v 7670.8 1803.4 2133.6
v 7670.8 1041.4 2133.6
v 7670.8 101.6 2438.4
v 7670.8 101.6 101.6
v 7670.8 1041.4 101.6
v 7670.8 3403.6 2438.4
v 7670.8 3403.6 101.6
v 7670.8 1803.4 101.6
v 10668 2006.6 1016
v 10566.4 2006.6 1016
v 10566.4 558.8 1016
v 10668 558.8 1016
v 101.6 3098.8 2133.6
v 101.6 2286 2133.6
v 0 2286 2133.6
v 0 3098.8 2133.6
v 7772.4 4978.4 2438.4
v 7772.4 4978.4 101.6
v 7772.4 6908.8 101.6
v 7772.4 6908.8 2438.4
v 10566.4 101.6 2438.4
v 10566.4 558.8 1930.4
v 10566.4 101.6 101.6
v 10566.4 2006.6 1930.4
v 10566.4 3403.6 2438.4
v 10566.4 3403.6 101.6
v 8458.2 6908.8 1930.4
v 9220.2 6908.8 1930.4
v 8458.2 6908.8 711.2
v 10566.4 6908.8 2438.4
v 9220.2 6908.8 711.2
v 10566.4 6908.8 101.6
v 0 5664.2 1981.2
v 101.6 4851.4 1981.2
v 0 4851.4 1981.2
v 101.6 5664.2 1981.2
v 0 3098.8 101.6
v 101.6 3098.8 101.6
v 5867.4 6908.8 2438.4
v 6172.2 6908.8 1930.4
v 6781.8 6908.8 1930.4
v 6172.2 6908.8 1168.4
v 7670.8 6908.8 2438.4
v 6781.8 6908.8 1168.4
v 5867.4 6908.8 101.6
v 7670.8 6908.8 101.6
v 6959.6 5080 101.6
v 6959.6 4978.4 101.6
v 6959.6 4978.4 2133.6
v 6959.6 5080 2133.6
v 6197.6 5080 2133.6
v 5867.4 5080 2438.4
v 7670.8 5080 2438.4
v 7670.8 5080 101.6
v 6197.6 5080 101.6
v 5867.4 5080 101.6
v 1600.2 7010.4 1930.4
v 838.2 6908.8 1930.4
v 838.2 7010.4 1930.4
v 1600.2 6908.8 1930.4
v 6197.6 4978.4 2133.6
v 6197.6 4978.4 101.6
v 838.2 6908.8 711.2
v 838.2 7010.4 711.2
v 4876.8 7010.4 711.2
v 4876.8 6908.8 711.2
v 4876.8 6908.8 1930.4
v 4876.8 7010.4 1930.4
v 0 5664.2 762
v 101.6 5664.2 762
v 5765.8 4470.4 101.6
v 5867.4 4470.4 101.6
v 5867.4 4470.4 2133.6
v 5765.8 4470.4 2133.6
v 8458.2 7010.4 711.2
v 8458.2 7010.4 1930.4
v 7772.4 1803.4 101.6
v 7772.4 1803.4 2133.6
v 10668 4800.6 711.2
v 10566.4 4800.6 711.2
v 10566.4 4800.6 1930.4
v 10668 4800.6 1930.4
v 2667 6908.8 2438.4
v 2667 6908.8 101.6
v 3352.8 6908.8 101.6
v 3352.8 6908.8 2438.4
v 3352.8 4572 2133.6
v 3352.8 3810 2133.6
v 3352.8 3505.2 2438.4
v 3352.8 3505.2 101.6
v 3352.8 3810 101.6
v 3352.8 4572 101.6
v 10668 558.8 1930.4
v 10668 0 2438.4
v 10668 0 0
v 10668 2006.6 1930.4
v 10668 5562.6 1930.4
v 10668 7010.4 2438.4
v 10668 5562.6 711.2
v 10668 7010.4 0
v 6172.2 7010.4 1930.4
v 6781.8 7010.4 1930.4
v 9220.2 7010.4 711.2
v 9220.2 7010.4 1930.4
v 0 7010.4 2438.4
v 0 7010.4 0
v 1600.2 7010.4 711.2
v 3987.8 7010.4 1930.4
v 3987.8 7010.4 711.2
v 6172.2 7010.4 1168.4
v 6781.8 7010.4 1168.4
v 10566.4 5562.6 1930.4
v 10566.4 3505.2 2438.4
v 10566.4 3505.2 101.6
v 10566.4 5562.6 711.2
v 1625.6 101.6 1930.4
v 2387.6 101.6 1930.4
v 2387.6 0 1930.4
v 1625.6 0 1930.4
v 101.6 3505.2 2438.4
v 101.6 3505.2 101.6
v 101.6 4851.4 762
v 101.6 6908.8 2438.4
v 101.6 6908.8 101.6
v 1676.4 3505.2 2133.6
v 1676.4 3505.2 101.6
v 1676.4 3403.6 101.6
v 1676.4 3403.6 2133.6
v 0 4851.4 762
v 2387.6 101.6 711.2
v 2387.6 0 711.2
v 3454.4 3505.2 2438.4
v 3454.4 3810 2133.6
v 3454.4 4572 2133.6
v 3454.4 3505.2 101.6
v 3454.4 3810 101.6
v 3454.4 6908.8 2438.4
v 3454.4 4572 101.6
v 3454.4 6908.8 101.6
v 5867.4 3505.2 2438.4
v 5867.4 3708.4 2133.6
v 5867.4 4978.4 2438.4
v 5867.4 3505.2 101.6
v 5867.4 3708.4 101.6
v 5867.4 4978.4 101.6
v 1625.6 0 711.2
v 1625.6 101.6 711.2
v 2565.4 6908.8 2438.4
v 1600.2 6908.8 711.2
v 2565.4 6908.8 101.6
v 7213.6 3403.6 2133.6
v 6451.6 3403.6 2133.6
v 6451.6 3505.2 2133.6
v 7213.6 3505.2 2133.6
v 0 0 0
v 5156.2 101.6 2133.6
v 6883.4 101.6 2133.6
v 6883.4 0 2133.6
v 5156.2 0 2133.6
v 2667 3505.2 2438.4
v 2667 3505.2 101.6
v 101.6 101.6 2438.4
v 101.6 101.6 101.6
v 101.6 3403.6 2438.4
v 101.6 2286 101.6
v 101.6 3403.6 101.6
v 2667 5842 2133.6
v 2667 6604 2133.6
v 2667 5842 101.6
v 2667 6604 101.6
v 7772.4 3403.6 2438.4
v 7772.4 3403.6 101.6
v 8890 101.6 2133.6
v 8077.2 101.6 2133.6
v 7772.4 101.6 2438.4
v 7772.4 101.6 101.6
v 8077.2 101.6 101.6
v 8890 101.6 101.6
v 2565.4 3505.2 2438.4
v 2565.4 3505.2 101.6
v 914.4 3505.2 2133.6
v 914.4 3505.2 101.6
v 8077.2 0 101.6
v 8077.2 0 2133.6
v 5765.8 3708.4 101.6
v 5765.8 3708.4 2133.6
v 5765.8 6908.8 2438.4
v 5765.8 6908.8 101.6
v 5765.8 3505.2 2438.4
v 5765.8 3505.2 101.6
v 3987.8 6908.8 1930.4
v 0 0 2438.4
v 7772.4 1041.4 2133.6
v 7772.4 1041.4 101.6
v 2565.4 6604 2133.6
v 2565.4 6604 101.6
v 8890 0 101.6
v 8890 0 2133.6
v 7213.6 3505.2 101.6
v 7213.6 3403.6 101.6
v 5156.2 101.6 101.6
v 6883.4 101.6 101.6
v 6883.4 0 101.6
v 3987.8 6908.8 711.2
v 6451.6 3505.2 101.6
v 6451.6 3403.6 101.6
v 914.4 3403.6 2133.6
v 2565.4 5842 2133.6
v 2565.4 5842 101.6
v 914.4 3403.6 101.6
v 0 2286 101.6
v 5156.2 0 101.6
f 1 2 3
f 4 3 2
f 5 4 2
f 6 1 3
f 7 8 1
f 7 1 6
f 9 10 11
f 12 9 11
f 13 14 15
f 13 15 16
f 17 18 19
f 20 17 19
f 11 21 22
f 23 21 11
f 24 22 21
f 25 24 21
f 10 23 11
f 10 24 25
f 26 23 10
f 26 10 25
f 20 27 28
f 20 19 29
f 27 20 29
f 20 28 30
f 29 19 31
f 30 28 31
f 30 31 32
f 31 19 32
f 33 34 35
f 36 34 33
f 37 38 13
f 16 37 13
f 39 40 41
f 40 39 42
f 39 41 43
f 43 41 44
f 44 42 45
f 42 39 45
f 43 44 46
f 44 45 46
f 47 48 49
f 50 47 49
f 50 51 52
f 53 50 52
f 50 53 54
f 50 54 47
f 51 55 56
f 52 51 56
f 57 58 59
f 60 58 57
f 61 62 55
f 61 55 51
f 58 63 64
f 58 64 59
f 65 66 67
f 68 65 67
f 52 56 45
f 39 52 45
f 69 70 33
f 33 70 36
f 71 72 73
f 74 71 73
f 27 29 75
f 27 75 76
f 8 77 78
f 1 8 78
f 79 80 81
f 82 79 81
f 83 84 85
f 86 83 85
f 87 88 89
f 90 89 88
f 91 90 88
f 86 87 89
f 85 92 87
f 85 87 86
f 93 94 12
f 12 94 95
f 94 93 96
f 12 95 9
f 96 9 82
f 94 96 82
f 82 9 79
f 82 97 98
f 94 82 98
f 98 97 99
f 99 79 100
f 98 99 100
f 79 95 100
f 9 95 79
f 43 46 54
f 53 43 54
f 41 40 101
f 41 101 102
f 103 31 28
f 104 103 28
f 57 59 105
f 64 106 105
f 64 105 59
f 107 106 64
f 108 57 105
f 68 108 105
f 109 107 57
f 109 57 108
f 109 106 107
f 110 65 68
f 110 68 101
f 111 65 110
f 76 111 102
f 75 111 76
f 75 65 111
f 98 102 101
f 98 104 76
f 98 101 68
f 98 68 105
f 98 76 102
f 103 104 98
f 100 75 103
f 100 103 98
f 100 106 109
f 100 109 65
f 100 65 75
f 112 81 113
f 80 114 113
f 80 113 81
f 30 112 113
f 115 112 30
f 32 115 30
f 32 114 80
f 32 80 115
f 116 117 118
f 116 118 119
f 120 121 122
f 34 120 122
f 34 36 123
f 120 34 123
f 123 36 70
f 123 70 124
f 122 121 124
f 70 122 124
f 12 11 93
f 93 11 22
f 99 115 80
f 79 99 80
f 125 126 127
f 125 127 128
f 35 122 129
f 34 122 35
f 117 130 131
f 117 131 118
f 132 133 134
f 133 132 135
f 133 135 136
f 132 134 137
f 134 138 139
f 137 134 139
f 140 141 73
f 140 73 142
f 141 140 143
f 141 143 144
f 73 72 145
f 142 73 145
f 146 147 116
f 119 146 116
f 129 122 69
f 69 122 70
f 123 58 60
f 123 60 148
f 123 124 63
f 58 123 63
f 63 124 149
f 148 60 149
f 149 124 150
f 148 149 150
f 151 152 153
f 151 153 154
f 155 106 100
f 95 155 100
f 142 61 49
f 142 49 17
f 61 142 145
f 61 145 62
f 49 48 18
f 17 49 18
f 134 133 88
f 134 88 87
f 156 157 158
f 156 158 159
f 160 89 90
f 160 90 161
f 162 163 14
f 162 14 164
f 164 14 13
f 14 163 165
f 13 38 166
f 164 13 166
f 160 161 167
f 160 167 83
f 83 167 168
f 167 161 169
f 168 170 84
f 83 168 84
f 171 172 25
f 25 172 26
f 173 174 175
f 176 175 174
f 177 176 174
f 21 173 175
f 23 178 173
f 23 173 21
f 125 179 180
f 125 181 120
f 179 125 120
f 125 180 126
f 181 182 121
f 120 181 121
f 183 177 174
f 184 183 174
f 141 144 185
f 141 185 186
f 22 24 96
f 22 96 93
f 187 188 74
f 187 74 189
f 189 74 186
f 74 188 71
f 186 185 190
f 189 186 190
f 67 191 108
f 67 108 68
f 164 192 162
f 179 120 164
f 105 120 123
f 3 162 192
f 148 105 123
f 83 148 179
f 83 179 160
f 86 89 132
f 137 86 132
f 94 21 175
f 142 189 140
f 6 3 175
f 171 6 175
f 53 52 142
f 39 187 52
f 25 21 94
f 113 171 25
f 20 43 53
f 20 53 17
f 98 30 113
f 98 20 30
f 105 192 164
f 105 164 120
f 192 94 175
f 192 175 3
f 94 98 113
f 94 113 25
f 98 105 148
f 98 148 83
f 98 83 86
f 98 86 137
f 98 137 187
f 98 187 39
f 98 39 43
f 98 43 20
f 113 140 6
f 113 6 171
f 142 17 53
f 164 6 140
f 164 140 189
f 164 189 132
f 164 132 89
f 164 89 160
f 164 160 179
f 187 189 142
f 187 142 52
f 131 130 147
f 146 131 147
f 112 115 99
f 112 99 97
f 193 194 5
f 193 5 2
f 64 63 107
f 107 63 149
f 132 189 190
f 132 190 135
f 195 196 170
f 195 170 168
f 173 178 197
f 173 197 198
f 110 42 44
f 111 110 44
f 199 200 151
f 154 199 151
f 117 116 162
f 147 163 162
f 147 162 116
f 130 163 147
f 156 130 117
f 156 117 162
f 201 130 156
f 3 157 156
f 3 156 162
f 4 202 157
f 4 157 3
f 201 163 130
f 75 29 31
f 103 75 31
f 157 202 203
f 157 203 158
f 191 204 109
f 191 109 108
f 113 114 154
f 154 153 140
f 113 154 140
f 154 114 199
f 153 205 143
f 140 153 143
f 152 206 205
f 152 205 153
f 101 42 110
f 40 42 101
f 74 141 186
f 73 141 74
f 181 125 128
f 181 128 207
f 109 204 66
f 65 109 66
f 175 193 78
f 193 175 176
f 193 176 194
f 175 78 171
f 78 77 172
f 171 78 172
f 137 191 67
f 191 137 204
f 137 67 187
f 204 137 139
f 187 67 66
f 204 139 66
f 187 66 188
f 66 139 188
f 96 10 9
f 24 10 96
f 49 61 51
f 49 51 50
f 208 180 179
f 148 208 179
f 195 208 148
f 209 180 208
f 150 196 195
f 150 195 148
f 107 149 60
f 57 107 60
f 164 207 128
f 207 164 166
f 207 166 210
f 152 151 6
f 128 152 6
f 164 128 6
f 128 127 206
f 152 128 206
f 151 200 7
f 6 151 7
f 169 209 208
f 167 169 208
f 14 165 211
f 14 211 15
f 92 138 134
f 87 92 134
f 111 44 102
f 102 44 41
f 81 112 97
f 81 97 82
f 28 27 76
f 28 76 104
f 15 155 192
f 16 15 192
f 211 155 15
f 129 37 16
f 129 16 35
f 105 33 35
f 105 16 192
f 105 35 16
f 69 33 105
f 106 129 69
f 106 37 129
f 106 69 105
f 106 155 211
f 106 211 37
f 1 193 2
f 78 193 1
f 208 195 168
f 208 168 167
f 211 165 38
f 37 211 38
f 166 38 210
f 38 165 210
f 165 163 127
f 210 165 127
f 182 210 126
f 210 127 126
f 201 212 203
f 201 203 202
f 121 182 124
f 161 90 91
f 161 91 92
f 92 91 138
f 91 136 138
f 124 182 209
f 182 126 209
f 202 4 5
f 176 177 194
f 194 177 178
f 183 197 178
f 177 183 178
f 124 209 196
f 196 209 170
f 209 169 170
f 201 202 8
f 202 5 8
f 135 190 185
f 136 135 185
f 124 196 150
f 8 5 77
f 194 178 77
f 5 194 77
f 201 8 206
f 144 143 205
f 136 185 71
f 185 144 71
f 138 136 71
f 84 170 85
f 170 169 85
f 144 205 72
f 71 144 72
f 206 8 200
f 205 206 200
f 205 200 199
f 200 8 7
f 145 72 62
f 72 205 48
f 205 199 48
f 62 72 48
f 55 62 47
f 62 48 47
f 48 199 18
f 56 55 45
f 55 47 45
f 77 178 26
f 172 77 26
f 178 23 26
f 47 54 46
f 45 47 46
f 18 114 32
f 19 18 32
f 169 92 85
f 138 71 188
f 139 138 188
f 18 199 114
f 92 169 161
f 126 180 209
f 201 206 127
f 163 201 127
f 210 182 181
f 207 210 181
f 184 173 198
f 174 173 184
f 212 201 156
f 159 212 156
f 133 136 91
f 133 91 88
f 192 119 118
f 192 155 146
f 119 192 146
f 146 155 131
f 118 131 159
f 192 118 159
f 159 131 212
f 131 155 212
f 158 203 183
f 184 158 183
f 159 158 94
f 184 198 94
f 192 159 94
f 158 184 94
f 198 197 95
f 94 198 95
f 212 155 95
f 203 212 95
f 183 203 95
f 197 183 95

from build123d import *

# Parameters (mm, degrees)
F34_W     = 10668
F34_H     = 7010.4
F0_DEPTH  = 2438.4
F35_T     = -101.6
F1_W      = 101.6
F1_H      = 3403.6
F1_H_2    = 3302
F2_DEPTH  = 2336.8
F36_W     = 762
F36_H     = 2032
F3_DEPTH  = 101.6
F37_W     = 812.8
F37_H     = 2032
F38_DEPTH = 101.6
F39_W     = 812.8
F39_H     = 2032
F4_DEPTH  = 101.6
F5_W      = 812.8
F5_H      = 1219.2
F6_DEPTH  = 101.6
F7_W      = 762
F7_H      = 1219.2
F40_DEPTH = 101.6
F8_W      = 762
F8_H      = 2032
F9_DEPTH  = 101.6
F10_W     = 762
F10_H     = 2032
F11_DEPTH = 101.6
F12_W     = 762
F12_H     = 2032
F13_DEPTH = 101.6
F14_W     = 762
F14_H     = 2032
F15_DEPTH = 101.6
F16_W     = 889
F16_H     = 1219.2
F17_DEPTH = 101.6
F18_W     = 609.6
F18_H     = 762
F19_DEPTH = 101.6
F20_W     = 1447.8
F20_H     = 914.4
F21_DEPTH = 101.6
F22_W     = 762
F22_H     = 1219.2
F23_DEPTH = 101.6
F24_W     = 762
F24_H     = 1219.2
F25_DEPTH = 101.6
F26_W     = 762
F26_H     = 1219.2
F27_DEPTH = 101.6
F28_W     = 1727.2
F28_H     = 2032
F29_DEPTH = 101.6
F30_W     = 762
F30_H     = 2032
F31_DEPTH = 101.6
F32_W     = 762
F32_H     = 2032
F33_DEPTH = 101.6


with BuildPart() as f0:
    # F34 (on Top) → F0 (new body)
    with BuildSketch(Plane.XY):
        with Locations((5334, 3505.2)):
            Rectangle(F34_W, F34_H)
    extrude(amount=F0_DEPTH)

    # F35
    f35_openings = [f0.faces().sort_by_distance(p)[0] for p in [
        (5334, 3505.2, 2438.4),
    ]]
    offset(amount=F35_T, openings=f35_openings)

    # F1 (on face) → F2 (join, through all)
    with BuildSketch(Plane.XY.offset(101.6)):
        with Locations((2616.2, 5207)):
            Rectangle(F1_W, F1_H)
        Polygon((7772.4, 3403.6), (10566.4, 3403.6), (10566.4, 3505.2), (5867.4, 3505.2), (5765.8, 3505.2), (3454.4, 3505.2), (3352.8, 3505.2), (2667, 3505.2), (2565.4, 3505.2), (101.6, 3505.2), (101.6, 3403.6), (7670.8, 3403.6), align=None)
        with Locations((3403.6, 5207)):
            Rectangle(F1_W, F1_H)
        Polygon((5765.8, 3505.2), (5867.4, 3505.2), (5867.4, 4978.4), (5867.4, 5080), (5867.4, 6908.8), (5765.8, 6908.8), align=None)
        Polygon((5867.4, 5080), (5867.4, 4978.4), (7772.4, 4978.4), (7772.4, 6908.8), (7670.8, 6908.8), (7670.8, 5080), align=None)
        with Locations((7721.6, 1752.6)):
            Rectangle(F1_W, F1_H_2)
    extrude(amount=F2_DEPTH)

    # F36 (on face) → F3 (cut, through all)
    with BuildSketch(Plane(origin=(0, 3505.2, 0), x_dir=(-1, 0, 0), z_dir=(0, 1, 0))):
        with Locations((-1295.4, 1117.6)):
            Rectangle(F36_W, F36_H)
    extrude(amount=-F3_DEPTH, mode=Mode.SUBTRACT)

    # F37 (on face) → F38 (cut, through all)
    with BuildSketch(Plane(origin=(0, 101.6, 0), x_dir=(-1, 0, 0), z_dir=(0, 1, 0))):
        with Locations((-8483.6, 1117.6)):
            Rectangle(F37_W, F37_H)
    extrude(amount=-F38_DEPTH, mode=Mode.SUBTRACT)

    # F39 (on face) → F4 (cut, through all)
    with BuildSketch(Plane.YZ.offset(101.6)):
        with Locations((2692.4, 1117.6)):
            Rectangle(F39_W, F39_H)
    extrude(amount=-F4_DEPTH, mode=Mode.SUBTRACT)

    # F5 (on face) → F6 (cut, through all)
    with BuildSketch(Plane.YZ.offset(101.6)):
        with Locations((5257.8, 1371.6)):
            Rectangle(F5_W, F5_H)
    extrude(amount=-F6_DEPTH, mode=Mode.SUBTRACT)

    # F7 (on face) → F40 (cut, through all)
    with BuildSketch(Plane.XZ.offset(-6908.8)):
        with Locations((1219.2, 1320.8)):
            Rectangle(F7_W, F7_H)
    extrude(amount=-F40_DEPTH, mode=Mode.SUBTRACT)

    # F8 (on face) → F9 (cut, through all)
    with BuildSketch(Plane.YZ.offset(7772.4)):
        with Locations((1422.4, 1117.6)):
            Rectangle(F8_W, F8_H)
    extrude(amount=-F9_DEPTH, mode=Mode.SUBTRACT)

    # F10 (on face) → F11 (cut, through all)
    with BuildSketch(Plane.XZ.offset(-3403.6)):
        with Locations((6832.6, 1117.6)):
            Rectangle(F10_W, F10_H)
    extrude(amount=-F11_DEPTH, mode=Mode.SUBTRACT)

    # F12 (on face) → F13 (cut, through all)
    with BuildSketch(Plane.XZ.offset(-4978.4)):
        with Locations((6578.6, 1117.6)):
            Rectangle(F12_W, F12_H)
    extrude(amount=-F13_DEPTH, mode=Mode.SUBTRACT)

    # F14 (on face) → F15 (cut, through all)
    with BuildSketch(Plane.YZ.offset(5867.4)):
        with Locations((4089.4, 1117.6)):
            Rectangle(F14_W, F14_H)
    extrude(amount=-F15_DEPTH, mode=Mode.SUBTRACT)

    # F16 (on face) → F17 (cut, through all)
    with BuildSketch(Plane.XZ.offset(-6908.8)):
        with Locations((4432.3, 1320.8)):
            Rectangle(F16_W, F16_H)
    extrude(amount=-F17_DEPTH, mode=Mode.SUBTRACT)

    # F18 (on face) → F19 (cut, through all)
    with BuildSketch(Plane.XZ.offset(-6908.8)):
        with Locations((6477, 1549.4)):
            Rectangle(F18_W, F18_H)
    extrude(amount=-F19_DEPTH, mode=Mode.SUBTRACT)

    # F20 (on face) → F21 (cut, through all)
    with BuildSketch(Plane(origin=(10566.4, 0, 0), x_dir=(0, -1, 0), z_dir=(-1, 0, 0))):
        with Locations((-1282.7, 1473.2)):
            Rectangle(F20_W, F20_H)
    extrude(amount=-F21_DEPTH, mode=Mode.SUBTRACT)

    # F22 (on face) → F23 (cut, through all)
    with BuildSketch(Plane.XZ.offset(-6908.8)):
        with Locations((8839.2, 1320.8)):
            Rectangle(F22_W, F22_H)
    extrude(amount=-F23_DEPTH, mode=Mode.SUBTRACT)

    # F24 (on face) → F25 (cut, through all)
    with BuildSketch(Plane(origin=(10566.4, 0, 0), x_dir=(0, -1, 0), z_dir=(-1, 0, 0))):
        with Locations((-5181.6, 1320.8)):
            Rectangle(F24_W, F24_H)
    extrude(amount=-F25_DEPTH, mode=Mode.SUBTRACT)

    # F26 (on face) → F27 (cut, through all)
    with BuildSketch(Plane(origin=(0, 101.6, 0), x_dir=(-1, 0, 0), z_dir=(0, 1, 0))):
        with Locations((-2006.6, 1320.8)):
            Rectangle(F26_W, F26_H)
    extrude(amount=-F27_DEPTH, mode=Mode.SUBTRACT)

    # F28 (on face) → F29 (cut, through all)
    with BuildSketch(Plane(origin=(0, 101.6, 0), x_dir=(-1, 0, 0), z_dir=(0, 1, 0))):
        with Locations((-6019.8, 1117.6)):
            Rectangle(F28_W, F28_H)
    extrude(amount=-F29_DEPTH, mode=Mode.SUBTRACT)

    # F30 (on face) → F31 (cut, through all)
    with BuildSketch(Plane(origin=(2565.4, 0, 0), x_dir=(0, -1, 0), z_dir=(-1, 0, 0))):
        with Locations((-6223, 1117.6)):
            Rectangle(F30_W, F30_H)
    extrude(amount=-F31_DEPTH, mode=Mode.SUBTRACT)

    # F32 (on face) → F33 (cut, through all)
    with BuildSketch(Plane.YZ.offset(3454.4)):
        with Locations((4191, 1117.6)):
            Rectangle(F32_W, F32_H)
    extrude(amount=-F33_DEPTH, mode=Mode.SUBTRACT)


solid = f0.part
